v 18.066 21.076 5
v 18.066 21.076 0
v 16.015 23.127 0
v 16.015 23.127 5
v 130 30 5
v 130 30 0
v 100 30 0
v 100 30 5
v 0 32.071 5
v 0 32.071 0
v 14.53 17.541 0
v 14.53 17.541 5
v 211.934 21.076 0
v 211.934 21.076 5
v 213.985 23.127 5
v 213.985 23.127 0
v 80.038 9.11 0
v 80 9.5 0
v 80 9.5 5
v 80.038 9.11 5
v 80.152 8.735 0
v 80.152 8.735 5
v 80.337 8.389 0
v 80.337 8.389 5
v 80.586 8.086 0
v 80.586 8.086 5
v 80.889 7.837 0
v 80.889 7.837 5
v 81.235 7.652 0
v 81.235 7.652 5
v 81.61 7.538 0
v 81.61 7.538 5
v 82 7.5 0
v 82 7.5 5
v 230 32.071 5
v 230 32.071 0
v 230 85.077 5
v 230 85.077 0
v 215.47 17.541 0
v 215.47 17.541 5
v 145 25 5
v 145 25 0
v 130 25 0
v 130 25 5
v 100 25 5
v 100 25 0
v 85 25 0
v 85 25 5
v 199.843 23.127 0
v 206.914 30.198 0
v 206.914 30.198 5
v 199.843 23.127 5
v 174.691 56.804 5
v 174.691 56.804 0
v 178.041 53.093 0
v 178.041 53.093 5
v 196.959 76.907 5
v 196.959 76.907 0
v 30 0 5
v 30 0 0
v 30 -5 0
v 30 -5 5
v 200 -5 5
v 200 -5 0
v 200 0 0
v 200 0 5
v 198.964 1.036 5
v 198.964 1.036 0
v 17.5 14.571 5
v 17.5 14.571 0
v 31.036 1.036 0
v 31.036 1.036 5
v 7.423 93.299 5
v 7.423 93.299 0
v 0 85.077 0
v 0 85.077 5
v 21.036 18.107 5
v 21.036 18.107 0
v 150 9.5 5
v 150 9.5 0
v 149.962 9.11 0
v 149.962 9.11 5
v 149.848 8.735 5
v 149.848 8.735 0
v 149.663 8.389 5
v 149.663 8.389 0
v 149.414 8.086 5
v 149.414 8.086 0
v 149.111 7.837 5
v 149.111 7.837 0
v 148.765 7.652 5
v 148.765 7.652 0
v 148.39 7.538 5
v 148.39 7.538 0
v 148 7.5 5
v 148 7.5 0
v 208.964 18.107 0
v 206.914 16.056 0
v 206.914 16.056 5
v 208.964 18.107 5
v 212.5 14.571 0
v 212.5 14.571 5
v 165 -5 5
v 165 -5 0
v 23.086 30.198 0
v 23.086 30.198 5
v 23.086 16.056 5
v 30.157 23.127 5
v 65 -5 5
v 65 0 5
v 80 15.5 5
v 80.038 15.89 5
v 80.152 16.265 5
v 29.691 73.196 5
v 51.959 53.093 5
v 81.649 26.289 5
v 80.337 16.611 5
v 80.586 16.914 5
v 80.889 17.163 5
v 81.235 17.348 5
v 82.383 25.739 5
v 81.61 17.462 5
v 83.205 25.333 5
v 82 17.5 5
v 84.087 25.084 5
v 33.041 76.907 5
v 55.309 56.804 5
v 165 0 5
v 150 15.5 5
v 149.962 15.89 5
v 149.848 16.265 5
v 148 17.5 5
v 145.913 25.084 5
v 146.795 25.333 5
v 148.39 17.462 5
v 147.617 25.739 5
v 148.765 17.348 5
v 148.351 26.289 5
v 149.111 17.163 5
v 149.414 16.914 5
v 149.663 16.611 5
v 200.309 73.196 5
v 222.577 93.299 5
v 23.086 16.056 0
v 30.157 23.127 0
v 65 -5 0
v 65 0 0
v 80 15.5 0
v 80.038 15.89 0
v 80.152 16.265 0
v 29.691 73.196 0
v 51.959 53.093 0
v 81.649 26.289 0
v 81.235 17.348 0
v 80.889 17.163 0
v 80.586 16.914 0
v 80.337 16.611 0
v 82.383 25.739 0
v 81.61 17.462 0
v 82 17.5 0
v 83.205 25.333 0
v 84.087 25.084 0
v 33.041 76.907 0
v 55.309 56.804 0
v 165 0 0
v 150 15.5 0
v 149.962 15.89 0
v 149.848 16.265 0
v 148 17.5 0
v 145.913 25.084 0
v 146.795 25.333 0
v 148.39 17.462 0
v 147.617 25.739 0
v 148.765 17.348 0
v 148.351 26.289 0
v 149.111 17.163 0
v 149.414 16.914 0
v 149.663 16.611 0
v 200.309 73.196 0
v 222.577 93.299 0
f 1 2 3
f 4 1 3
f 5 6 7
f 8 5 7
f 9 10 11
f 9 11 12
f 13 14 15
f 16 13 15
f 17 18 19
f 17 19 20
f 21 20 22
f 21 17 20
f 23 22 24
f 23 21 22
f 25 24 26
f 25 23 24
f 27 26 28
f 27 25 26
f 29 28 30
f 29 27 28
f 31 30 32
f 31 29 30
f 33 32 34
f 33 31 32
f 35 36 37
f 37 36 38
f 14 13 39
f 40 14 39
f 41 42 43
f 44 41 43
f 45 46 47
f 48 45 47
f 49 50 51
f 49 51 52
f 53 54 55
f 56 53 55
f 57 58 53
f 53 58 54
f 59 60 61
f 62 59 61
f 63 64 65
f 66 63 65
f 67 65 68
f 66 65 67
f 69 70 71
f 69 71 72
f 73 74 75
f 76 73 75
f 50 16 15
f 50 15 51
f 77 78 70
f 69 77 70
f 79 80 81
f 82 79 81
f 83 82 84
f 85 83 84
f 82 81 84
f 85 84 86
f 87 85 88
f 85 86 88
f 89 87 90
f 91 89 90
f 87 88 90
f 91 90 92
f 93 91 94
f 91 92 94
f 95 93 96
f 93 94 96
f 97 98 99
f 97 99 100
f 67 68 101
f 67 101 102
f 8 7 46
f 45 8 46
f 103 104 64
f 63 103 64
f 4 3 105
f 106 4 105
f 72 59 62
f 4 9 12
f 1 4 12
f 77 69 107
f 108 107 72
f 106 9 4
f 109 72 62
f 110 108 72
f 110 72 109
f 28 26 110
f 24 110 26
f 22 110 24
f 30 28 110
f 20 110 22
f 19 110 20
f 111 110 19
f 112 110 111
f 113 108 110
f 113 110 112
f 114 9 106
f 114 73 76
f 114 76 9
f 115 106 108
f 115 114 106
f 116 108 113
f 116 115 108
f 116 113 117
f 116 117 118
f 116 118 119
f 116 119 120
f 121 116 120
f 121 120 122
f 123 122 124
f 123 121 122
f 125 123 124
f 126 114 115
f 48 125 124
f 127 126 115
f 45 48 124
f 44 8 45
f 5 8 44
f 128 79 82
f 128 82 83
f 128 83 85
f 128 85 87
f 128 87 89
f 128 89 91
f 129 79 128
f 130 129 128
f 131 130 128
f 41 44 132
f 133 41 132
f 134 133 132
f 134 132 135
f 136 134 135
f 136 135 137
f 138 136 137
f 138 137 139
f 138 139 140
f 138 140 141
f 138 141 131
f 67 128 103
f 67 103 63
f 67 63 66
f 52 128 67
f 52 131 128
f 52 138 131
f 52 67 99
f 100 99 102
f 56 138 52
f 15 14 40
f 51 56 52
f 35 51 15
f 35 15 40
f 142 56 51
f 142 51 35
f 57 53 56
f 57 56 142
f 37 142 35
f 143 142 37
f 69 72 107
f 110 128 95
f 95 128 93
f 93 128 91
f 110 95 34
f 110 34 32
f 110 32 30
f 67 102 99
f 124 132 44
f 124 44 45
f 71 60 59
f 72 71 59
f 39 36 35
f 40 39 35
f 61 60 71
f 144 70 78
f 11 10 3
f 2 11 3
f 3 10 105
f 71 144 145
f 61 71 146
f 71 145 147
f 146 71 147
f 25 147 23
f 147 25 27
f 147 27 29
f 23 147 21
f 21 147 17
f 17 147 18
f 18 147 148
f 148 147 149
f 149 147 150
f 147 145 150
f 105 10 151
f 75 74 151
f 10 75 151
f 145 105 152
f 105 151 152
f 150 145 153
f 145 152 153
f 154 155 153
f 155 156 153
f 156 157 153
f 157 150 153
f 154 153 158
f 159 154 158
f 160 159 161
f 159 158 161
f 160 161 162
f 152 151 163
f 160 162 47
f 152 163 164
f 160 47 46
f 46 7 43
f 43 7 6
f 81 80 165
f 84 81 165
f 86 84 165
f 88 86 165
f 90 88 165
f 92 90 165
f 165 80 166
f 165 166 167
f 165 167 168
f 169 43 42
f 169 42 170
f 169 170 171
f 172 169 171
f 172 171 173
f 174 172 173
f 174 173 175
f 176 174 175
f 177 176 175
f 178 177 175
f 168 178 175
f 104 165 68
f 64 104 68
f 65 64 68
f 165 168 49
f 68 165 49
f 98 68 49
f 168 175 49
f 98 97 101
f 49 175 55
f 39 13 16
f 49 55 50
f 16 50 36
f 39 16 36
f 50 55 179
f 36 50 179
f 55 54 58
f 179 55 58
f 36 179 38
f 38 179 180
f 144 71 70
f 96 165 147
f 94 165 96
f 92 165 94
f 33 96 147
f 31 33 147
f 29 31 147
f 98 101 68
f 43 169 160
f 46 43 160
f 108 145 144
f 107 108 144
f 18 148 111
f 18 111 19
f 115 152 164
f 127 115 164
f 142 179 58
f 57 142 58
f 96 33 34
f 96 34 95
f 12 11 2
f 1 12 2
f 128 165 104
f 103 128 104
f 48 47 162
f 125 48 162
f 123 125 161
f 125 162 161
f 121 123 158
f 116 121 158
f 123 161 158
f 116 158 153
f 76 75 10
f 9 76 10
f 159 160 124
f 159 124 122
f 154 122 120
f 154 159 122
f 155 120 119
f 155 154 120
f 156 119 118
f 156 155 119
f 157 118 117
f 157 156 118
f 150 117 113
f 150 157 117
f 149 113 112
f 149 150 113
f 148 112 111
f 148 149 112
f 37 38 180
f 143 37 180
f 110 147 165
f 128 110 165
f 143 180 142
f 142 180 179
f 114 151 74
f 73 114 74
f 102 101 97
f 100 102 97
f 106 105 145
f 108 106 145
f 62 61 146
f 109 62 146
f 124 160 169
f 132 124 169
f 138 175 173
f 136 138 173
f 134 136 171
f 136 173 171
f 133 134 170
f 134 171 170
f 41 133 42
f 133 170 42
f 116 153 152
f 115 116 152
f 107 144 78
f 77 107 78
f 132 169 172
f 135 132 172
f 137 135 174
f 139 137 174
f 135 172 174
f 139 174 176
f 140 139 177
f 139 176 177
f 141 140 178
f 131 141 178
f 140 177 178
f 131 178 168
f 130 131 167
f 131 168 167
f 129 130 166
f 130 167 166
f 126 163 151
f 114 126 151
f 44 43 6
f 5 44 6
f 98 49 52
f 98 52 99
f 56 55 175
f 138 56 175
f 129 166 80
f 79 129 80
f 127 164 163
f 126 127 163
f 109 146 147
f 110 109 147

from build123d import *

# Parameters (mm, degrees)
BOSS_EXTRUDE1_DEPTH = 5
CUT_EXTRUDE1_DEPTH  = 10
CUT_EXTRUDE2_DEPTH  = 10
SKETCH5_W           = 5
SKETCH5_H           = 43.988909765
CUT_EXTRUDE4_DEPTH  = 5
CUT_EXTRUDE6_DEPTH  = 10
SKETCH8_W           = 43
SKETCH8_H           = 10
CUT_EXTRUDE7_DEPTH  = 10


with BuildPart() as part:
    # Sketch1 → Boss-Extrude1 (new body)
    with BuildSketch(Plane.XY):
        with BuildLine():
            Line((100, 25), (85, 25))
            ThreePointArc((85, 25), (83.205104603, 25.333271969), (81.649484536, 26.288659794))
            Line((81.649484536, 26.288659794), (51.958762887, 53.092783505))
            Line((51.958762887, 53.092783505), (55.309278351, 56.804123711))
            Line((55.309278351, 56.804123711), (33.041237113, 76.907216495))
            Line((33.041237113, 76.907216495), (29.690721649, 73.195876289))
            Line((29.690721649, 73.195876289), (7.422680412, 93.298969072))
            Line((7.422680412, 93.298969072), (0, 85.076923077))
            Line((0, 85.076923077), (0, 0))
            Line((0, 0), (30, 0))
            Line((30, 0), (30, -5))
            Line((30, -5), (65, -5))
            Line((65, -5), (65, 0))
            Line((65, 0), (165, 0))
            Line((165, 0), (165, -5))
            Line((165, -5), (200, -5))
            Line((200, -5), (200, 0))
            Line((200, 0), (230, 0))
            Line((230, 0), (230, 85.076923077))
            Line((230, 85.076923077), (222.577319588, 93.298969072))
            Line((222.577319588, 93.298969072), (200.309278351, 73.195876289))
            Line((200.309278351, 73.195876289), (196.958762887, 76.907216495))
            Line((196.958762887, 76.907216495), (174.690721649, 56.804123711))
            Line((174.690721649, 56.804123711), (178.041237113, 53.092783505))
            Line((178.041237113, 53.092783505), (148.350515464, 26.288659794))
            ThreePointArc((148.350515464, 26.288659794), (146.794895397, 25.333271969), (145, 25))
            Line((145, 25), (130, 25))
            Line((130, 25), (130, 30))
            Line((130, 30), (100, 30))
            Line((100, 30), (100, 25))
        make_face()
    extrude(amount=BOSS_EXTRUDE1_DEPTH)

    # Sketch2 → Cut-Extrude1 (cut)
    with BuildSketch(Plane(origin=(0, 0, 0), x_dir=(-1, 0, 0), z_dir=(0, 0, -1))):
        Polygon((0, 25), (0, 0), (-25, 0), align=None)
        Polygon((-230, 0), (-205, 0), (-230, 25), align=None)
    extrude(amount=-CUT_EXTRUDE1_DEPTH, mode=Mode.SUBTRACT)

    # Sketch3 → Cut-Extrude2 (cut)
    with BuildSketch(Plane(origin=(0, 0, 0), x_dir=(-1, 0, 0), z_dir=(0, 0, -1))):
        with BuildLine():
            Line((-82, 7.5), (-93.5, 7.5))
            ThreePointArc((-93.5, 7.5), (-94.914213562, 8.085786438), (-95.5, 9.5))
            Line((-95.5, 9.5), (-95.5, 15.5))
            ThreePointArc((-95.5, 15.5), (-94.914213562, 16.914213562), (-93.5, 17.5))
            Line((-93.5, 17.5), (-82, 17.5))
            ThreePointArc((-82, 17.5), (-80.585786438, 16.914213562), (-80, 15.5))
            Line((-80, 15.5), (-80, 9.5))
            ThreePointArc((-80, 9.5), (-80.585786438, 8.085786438), (-82, 7.5))
        make_face()
        with BuildLine():
            Line((-134.5, 9.5), (-134.5, 15.5))
            ThreePointArc((-134.5, 15.5), (-135.085786438, 16.914213562), (-136.5, 17.5))
            Line((-136.5, 17.5), (-148, 17.5))
            ThreePointArc((-148, 17.5), (-149.414213562, 16.914213562), (-150, 15.5))
            Line((-150, 15.5), (-150, 9.5))
            ThreePointArc((-150, 9.5), (-149.414213562, 8.085786438), (-148, 7.5))
            Line((-148, 7.5), (-136.5, 7.5))
            ThreePointArc((-136.5, 7.5), (-135.085786438, 8.085786438), (-134.5, 9.5))
        make_face()
    extrude(amount=-CUT_EXTRUDE2_DEPTH, mode=Mode.SUBTRACT)

    # Sketch5 → Cut-Extrude4 (cut)
    with BuildSketch(Plane(origin=(12.5, 12.5, 0), x_dir=(0, 0, 1), z_dir=(-0.707106781, -0.707106781, 0))):
        with Locations((2.5, 0.781251447)):
            Rectangle(SKETCH5_W, SKETCH5_H)
    cut_extrude4 = extrude(amount=-CUT_EXTRUDE4_DEPTH, mode=Mode.SUBTRACT)

    # Mirror1: Cut-Extrude4 across plane
    add(cut_extrude4.mirror(Plane(origin=(115, 0, 0), x_dir=(0, 0, 1), z_dir=(1, 0, 0))), mode=Mode.SUBTRACT)

    # Sketch7 → Cut-Extrude6 (cut)
    with BuildSketch(Plane(origin=(0, 0, 0), x_dir=(-1, 0, 0), z_dir=(0, 0, -1))):
        Polygon((-23.086143571, 16.055992052), (-21.035533906, 18.106601718), (-18.065685425, 21.076450199), (-16.01507576, 23.127059864), (-23.086143571, 30.198127676), (-30.157211383, 23.127059864), align=None)
        Polygon((-21.035533906, 18.106601718), (-17.5, 14.571067812), (-14.530151519, 17.540916293), (-18.065685425, 21.076450199), align=None)
        Polygon((-213.98492424, 23.127059864), (-206.913856429, 30.198127676), (-199.842788617, 23.127059864), (-206.913856429, 16.055992052), align=None)
        Polygon((-208.964466094, 18.106601718), (-211.934314575, 21.076450199), (-215.469848481, 17.540916293), (-212.5, 14.571067812), align=None)
    extrude(amount=-CUT_EXTRUDE6_DEPTH, mode=Mode.SUBTRACT)

    # Sketch8 → Cut-Extrude7 (cut)
    with BuildSketch(Plane(origin=(0, 0, 0), x_dir=(-1, 0, 0), z_dir=(0, 0, -1))):
        with Locations((-115, 12.5)):
            Rectangle(SKETCH8_W, SKETCH8_H)
    extrude(amount=-CUT_EXTRUDE7_DEPTH, mode=Mode.SUBTRACT)


solid = part.part
